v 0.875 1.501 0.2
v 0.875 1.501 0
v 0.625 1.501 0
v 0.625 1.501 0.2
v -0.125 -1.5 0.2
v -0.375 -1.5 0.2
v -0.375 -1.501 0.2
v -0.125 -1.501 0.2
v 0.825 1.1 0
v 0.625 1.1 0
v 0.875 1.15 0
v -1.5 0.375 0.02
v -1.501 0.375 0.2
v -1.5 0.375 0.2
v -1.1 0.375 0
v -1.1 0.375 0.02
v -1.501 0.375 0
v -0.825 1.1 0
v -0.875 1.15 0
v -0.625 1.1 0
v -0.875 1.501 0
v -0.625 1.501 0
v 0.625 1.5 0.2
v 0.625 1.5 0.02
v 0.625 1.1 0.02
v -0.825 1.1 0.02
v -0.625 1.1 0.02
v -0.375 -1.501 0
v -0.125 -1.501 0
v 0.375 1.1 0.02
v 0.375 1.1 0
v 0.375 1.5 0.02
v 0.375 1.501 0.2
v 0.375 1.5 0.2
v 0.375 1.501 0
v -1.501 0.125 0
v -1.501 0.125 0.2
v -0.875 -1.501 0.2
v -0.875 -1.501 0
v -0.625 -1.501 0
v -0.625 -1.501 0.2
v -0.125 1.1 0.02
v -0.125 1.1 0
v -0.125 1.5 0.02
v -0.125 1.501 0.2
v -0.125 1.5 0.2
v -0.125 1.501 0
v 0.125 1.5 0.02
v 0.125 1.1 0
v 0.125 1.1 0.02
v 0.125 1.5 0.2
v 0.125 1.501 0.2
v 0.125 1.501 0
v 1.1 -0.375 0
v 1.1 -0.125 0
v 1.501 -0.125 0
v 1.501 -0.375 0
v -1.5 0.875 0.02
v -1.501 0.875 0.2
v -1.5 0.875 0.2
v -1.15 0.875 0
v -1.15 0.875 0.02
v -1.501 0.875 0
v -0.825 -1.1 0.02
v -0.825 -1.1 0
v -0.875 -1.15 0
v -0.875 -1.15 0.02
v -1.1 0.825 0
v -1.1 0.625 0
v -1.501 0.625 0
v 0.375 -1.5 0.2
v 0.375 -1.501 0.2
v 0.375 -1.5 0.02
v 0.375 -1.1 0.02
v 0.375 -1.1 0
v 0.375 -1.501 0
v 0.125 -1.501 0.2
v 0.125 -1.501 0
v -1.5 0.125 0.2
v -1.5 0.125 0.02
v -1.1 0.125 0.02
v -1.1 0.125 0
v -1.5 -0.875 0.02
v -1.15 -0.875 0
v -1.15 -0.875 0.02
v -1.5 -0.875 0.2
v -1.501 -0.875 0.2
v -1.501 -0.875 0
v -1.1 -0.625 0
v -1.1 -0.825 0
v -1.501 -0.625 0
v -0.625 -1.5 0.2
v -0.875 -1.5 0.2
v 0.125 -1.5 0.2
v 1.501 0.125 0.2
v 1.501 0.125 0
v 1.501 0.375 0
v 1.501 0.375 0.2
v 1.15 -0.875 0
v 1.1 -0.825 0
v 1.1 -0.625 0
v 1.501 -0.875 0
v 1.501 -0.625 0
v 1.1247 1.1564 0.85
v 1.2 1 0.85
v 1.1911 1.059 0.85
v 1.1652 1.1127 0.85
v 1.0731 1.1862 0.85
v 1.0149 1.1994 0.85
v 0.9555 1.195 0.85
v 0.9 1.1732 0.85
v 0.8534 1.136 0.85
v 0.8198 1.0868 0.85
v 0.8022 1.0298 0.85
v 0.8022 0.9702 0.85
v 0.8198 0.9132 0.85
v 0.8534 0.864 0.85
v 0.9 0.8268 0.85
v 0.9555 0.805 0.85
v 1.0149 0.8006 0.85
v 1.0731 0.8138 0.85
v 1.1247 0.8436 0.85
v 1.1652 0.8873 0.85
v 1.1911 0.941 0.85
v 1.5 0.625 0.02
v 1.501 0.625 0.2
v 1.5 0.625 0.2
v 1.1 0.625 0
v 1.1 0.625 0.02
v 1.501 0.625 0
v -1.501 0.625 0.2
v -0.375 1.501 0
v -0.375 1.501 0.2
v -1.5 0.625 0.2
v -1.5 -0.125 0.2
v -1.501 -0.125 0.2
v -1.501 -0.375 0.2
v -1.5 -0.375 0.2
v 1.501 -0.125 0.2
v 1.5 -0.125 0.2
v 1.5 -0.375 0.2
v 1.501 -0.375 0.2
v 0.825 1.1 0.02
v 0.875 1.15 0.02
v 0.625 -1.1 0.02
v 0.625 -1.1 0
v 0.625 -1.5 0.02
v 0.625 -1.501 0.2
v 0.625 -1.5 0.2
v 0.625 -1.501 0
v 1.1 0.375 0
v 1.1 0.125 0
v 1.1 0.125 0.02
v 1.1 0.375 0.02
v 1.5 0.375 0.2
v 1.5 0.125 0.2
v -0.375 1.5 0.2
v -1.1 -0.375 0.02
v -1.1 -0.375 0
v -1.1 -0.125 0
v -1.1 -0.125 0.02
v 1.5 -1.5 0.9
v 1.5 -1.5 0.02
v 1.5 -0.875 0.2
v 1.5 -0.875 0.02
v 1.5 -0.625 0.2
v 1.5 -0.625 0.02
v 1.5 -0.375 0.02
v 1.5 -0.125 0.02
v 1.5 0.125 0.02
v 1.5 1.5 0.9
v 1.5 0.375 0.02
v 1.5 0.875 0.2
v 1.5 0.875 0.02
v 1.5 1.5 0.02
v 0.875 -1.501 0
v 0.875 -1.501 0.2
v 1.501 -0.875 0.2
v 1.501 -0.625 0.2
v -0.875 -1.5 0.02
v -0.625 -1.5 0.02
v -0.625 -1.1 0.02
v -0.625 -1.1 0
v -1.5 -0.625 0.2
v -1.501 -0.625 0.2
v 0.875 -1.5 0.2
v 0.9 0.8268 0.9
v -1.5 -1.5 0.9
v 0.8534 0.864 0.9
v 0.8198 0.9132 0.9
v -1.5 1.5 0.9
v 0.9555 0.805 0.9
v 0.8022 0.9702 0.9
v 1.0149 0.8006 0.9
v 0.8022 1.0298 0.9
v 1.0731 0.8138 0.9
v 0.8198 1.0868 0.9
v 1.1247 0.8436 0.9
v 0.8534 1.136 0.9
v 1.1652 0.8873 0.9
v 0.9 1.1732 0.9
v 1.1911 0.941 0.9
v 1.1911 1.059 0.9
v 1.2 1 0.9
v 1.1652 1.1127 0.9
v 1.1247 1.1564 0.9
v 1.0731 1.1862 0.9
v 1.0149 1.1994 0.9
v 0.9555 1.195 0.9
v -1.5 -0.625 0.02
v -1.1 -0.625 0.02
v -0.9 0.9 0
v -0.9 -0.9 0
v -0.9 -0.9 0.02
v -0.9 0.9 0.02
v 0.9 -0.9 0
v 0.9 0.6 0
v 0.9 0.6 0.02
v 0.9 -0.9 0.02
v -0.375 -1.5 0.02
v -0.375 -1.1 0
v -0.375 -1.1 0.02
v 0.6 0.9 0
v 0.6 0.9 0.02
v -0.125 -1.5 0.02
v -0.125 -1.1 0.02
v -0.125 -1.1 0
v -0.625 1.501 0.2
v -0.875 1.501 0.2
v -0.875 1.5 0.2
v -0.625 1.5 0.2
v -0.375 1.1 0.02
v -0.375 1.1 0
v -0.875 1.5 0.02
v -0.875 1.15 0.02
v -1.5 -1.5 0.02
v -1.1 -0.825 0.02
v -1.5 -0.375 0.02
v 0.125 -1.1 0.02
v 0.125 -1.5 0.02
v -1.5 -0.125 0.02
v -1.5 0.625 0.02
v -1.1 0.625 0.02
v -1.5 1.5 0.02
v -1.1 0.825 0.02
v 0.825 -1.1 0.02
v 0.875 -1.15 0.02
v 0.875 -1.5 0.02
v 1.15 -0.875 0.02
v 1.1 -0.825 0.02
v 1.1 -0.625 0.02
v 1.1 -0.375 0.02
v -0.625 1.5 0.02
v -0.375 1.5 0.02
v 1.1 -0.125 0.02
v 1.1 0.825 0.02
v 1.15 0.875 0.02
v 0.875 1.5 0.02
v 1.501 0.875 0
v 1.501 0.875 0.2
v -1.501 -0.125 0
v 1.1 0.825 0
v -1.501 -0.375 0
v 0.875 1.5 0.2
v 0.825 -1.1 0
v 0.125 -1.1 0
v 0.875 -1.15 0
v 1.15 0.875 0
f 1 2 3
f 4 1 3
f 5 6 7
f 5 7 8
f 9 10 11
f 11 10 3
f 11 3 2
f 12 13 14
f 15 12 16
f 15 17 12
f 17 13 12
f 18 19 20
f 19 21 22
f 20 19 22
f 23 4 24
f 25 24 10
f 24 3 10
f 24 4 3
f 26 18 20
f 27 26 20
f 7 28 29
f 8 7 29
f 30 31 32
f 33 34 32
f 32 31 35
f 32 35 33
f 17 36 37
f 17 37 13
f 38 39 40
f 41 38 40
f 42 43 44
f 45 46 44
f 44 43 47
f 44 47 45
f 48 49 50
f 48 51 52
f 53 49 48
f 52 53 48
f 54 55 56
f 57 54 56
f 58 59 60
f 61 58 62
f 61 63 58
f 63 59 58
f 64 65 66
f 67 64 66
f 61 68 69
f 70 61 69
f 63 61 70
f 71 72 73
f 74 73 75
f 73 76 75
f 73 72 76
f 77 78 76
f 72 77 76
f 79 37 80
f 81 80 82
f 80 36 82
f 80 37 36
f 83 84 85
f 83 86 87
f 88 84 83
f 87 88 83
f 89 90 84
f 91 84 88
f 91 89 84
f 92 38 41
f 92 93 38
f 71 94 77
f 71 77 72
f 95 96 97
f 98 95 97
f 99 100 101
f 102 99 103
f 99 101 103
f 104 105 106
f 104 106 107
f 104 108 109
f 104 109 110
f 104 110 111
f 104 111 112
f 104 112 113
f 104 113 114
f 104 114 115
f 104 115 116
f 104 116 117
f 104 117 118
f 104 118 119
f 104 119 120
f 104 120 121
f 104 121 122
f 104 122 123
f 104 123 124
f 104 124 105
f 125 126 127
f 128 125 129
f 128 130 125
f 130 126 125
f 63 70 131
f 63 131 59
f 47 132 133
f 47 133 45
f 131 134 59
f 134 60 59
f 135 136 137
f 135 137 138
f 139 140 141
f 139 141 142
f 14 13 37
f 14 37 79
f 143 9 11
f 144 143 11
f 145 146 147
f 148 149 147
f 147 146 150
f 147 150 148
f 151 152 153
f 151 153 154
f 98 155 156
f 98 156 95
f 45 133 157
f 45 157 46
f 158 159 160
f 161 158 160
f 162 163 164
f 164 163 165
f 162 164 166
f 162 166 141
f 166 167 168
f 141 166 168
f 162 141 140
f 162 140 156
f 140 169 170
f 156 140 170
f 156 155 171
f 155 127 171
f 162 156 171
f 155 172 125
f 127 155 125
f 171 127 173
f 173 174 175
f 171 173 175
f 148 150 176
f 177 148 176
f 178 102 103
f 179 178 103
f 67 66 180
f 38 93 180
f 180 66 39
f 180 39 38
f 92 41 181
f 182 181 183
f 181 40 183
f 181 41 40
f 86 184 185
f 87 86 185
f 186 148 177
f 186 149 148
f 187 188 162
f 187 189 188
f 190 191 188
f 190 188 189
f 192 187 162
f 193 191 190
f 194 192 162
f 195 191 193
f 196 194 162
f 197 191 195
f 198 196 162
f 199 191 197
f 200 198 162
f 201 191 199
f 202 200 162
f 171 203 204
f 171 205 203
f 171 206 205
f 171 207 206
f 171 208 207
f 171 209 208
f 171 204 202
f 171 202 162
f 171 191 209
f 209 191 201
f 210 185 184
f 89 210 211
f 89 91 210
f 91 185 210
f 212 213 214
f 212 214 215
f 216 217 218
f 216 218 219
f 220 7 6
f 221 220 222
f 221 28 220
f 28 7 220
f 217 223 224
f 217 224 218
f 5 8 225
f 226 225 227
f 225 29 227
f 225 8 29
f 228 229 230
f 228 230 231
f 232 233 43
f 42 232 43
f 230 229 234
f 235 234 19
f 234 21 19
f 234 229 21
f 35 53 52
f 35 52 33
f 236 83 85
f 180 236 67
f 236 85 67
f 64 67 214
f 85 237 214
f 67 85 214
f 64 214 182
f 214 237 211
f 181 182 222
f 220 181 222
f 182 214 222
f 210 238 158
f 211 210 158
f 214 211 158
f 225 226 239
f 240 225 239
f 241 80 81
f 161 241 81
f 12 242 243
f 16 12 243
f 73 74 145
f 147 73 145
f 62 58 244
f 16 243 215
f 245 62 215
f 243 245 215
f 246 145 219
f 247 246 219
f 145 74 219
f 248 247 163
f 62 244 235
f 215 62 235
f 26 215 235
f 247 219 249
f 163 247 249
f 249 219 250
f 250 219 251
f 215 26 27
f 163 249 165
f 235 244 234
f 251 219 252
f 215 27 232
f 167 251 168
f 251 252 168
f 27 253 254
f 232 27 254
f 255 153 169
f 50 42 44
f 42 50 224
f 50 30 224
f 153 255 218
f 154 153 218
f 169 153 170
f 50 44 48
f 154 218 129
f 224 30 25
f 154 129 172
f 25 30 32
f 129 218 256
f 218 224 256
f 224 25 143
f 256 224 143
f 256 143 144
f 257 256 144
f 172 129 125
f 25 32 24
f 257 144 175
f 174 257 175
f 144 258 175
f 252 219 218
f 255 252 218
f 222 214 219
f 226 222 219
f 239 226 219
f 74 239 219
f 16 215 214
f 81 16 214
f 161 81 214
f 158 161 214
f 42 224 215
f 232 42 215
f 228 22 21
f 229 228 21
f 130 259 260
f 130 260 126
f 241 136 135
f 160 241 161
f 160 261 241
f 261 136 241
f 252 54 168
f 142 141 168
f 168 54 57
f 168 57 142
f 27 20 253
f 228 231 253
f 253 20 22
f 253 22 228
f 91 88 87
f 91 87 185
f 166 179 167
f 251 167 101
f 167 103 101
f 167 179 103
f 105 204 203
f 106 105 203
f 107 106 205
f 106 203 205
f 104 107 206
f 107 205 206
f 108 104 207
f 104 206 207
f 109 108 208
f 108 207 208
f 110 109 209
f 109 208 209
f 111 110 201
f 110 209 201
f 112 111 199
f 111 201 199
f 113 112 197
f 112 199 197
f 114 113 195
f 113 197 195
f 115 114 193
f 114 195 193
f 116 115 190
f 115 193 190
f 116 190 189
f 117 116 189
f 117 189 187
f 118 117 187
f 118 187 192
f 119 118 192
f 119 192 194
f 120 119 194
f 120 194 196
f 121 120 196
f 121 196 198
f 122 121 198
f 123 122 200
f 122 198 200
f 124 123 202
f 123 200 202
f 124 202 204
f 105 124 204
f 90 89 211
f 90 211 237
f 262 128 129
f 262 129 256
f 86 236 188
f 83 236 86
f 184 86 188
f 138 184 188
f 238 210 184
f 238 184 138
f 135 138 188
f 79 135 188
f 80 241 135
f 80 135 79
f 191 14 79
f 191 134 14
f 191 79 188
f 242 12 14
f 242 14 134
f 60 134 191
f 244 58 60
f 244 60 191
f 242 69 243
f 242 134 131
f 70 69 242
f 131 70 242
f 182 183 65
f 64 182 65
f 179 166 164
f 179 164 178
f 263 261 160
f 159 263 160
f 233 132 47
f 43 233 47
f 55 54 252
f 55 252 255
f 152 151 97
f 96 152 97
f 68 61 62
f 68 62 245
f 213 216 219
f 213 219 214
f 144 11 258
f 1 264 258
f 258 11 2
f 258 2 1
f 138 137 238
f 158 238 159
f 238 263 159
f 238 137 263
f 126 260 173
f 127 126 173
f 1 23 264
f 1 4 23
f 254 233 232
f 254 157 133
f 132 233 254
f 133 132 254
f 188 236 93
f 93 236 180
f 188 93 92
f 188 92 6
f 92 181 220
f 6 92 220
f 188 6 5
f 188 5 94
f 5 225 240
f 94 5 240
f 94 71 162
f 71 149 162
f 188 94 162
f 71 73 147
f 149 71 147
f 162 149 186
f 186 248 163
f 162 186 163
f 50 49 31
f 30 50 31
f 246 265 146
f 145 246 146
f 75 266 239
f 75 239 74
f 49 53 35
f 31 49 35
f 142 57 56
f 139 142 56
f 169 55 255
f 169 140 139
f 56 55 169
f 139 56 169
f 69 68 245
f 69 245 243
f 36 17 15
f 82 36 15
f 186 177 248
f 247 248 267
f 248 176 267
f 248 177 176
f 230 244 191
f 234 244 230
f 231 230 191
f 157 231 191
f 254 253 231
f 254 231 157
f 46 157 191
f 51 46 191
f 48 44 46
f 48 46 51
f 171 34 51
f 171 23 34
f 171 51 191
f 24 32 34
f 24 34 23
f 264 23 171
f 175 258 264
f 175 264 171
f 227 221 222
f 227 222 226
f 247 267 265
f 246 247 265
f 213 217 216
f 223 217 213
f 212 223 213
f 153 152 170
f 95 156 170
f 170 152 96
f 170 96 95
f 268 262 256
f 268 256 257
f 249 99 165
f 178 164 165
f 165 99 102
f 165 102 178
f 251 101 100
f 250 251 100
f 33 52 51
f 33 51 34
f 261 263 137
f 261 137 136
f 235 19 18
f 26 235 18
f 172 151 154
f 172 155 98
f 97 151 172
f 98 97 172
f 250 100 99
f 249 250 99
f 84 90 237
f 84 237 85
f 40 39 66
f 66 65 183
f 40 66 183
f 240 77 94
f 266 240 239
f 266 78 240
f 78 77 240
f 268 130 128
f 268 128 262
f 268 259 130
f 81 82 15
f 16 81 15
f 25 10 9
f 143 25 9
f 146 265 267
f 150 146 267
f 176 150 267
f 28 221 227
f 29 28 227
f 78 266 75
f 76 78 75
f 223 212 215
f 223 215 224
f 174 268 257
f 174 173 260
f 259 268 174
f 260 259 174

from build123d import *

# Parameters (mm, degrees)
SKETCH1_W      = 3
SKETCH1_H      = 3
EXTRUDE1_DEPTH = 0.88
SKETCH2_W      = 0.25
SKETCH2_H      = 0.401
SKETCH2_W_2    = 0.401
SKETCH2_H_2    = 0.25
EXTRUDE2_DEPTH = 0.2
SKETCH3_R      = 0.2
EXTRUDE3_DEPTH = 0.05


with BuildPart() as part:
    # Sketch1 → Extrude1 (new body)
    with BuildSketch(Plane.XY.offset(0.02)):
        Rectangle(SKETCH1_W, SKETCH1_H)
    extrude(amount=EXTRUDE1_DEPTH)

    # Sketch2 → Extrude2 (add)
    with BuildSketch(Plane.XY):
        Polygon((0.6, 0.9), (0.9, 0.6), (0.9, -0.9), (-0.9, -0.9), (-0.9, 0.9), align=None)
        Polygon((0.825, 1.1), (0.875, 1.15), (0.875, 1.501), (0.625, 1.501), (0.625, 1.1), align=None)
        Polygon((-0.875, 1.15), (-0.825, 1.1), (-0.625, 1.1), (-0.625, 1.501), (-0.875, 1.501), align=None)
        with Locations((-0.25, 1.3005)):
            Rectangle(SKETCH2_W, SKETCH2_H)
        with Locations((0.25, 1.3005)):
            Rectangle(SKETCH2_W, SKETCH2_H)
        Polygon((-1.501, 0.625), (-1.501, 0.875), (-1.15, 0.875), (-1.1, 0.825), (-1.1, 0.625), align=None)
        Polygon((0.875, -1.501), (0.875, -1.15), (0.825, -1.1), (0.625, -1.1), (0.625, -1.501), align=None)
        with Locations((0.25, -1.3005)):
            Rectangle(SKETCH2_W, SKETCH2_H)
        with Locations((-0.25, -1.3005)):
            Rectangle(SKETCH2_W, SKETCH2_H)
        Polygon((-0.625, -1.501), (-0.625, -1.1), (-0.825, -1.1), (-0.875, -1.15), (-0.875, -1.501), align=None)
        Polygon((1.501, -0.625), (1.1, -0.625), (1.1, -0.825), (1.15, -0.875), (1.501, -0.875), align=None)
        Polygon((1.501, 0.625), (1.1, 0.625), (1.1, 0.825), (1.15, 0.875), (1.501, 0.875), align=None)
        with Locations((1.3005, -0.25)):
            Rectangle(SKETCH2_W_2, SKETCH2_H_2)
        with Locations((-1.3005, -0.25)):
            Rectangle(SKETCH2_W_2, SKETCH2_H_2)
        Polygon((-1.501, -0.625), (-1.1, -0.625), (-1.1, -0.825), (-1.15, -0.875), (-1.501, -0.875), align=None)
        with Locations((-1.3005, 0.25)):
            Rectangle(SKETCH2_W_2, SKETCH2_H_2)
        with Locations((1.3005, 0.25)):
            Rectangle(SKETCH2_W_2, SKETCH2_H_2)
    extrude(amount=EXTRUDE2_DEPTH)

    # Sketch3 → Extrude3 (cut)
    with BuildSketch(Plane.XY.offset(0.9)):
        with Locations((1, 1)):
            Circle(SKETCH3_R)
    extrude(amount=-EXTRUDE3_DEPTH, mode=Mode.SUBTRACT)


solid = part.part
